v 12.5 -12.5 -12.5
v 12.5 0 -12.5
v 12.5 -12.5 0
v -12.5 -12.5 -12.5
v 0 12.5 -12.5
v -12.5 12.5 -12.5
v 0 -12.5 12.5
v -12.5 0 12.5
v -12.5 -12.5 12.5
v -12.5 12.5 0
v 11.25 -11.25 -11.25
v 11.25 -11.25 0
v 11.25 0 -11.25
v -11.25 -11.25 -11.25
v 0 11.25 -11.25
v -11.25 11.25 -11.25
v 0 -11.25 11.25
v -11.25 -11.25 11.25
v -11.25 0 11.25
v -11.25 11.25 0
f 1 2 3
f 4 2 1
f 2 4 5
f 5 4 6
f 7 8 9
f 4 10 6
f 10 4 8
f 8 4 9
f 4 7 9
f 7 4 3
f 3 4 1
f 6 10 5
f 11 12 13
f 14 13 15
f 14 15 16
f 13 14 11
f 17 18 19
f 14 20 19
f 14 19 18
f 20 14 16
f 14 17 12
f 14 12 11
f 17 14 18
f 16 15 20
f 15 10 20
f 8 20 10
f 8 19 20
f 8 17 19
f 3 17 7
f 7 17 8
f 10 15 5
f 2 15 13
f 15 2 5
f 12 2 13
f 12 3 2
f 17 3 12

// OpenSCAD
// Menger Sponge

// Size of edge of sponge
D=25;
// Fractal depth (number of iterations)
n=1;

echo(version=version());

module menger() {
  difference() {
    cube(D, center=true);
    for (v=[[0,0,0], [0,0,90], [0,90,0]])
      rotate(v) menger_negative(side=D, maxside=D, level=n);
  }
}

module menger_negative(side=1, maxside=1, level=1) {
  l=side/3;
  cube([maxside*1.1, l, l], center=true);
  if (level > 1) {
    for (i=[-1:1], j=[-1:1])
      if (i || j)
        translate([0, i*l, j*l])
          menger_negative(side=l*1.05, maxside=maxside, level=level-1);
  }
}


rotate([180-45, 0, 0])
rotate([0, -atan(1/sqrt(2)), 0])
difference() {
    rotate([45, atan(1/sqrt(2)), 0]) {  //menger();
        difference() {
            cube(D, true);
            cube(D*.9, true);
        }
    }
    translate([0,0,-D]) cube(2*D, center=true);
}

// Written by Nathan Hellweg, Emmett Lalish and Marius Kintel May 13, 2013
//
// To the extent possible under law, the author(s) have dedicated all
// copyright and related and neighboring rights to this software to the
// public domain worldwide. This software is distributed without any
// warranty.
//
// You should have received a copy of the CC0 Public Domain
// Dedication along with this software.
// If not, see <http://creativecommons.org/publicdomain/zero/1.0/>.
